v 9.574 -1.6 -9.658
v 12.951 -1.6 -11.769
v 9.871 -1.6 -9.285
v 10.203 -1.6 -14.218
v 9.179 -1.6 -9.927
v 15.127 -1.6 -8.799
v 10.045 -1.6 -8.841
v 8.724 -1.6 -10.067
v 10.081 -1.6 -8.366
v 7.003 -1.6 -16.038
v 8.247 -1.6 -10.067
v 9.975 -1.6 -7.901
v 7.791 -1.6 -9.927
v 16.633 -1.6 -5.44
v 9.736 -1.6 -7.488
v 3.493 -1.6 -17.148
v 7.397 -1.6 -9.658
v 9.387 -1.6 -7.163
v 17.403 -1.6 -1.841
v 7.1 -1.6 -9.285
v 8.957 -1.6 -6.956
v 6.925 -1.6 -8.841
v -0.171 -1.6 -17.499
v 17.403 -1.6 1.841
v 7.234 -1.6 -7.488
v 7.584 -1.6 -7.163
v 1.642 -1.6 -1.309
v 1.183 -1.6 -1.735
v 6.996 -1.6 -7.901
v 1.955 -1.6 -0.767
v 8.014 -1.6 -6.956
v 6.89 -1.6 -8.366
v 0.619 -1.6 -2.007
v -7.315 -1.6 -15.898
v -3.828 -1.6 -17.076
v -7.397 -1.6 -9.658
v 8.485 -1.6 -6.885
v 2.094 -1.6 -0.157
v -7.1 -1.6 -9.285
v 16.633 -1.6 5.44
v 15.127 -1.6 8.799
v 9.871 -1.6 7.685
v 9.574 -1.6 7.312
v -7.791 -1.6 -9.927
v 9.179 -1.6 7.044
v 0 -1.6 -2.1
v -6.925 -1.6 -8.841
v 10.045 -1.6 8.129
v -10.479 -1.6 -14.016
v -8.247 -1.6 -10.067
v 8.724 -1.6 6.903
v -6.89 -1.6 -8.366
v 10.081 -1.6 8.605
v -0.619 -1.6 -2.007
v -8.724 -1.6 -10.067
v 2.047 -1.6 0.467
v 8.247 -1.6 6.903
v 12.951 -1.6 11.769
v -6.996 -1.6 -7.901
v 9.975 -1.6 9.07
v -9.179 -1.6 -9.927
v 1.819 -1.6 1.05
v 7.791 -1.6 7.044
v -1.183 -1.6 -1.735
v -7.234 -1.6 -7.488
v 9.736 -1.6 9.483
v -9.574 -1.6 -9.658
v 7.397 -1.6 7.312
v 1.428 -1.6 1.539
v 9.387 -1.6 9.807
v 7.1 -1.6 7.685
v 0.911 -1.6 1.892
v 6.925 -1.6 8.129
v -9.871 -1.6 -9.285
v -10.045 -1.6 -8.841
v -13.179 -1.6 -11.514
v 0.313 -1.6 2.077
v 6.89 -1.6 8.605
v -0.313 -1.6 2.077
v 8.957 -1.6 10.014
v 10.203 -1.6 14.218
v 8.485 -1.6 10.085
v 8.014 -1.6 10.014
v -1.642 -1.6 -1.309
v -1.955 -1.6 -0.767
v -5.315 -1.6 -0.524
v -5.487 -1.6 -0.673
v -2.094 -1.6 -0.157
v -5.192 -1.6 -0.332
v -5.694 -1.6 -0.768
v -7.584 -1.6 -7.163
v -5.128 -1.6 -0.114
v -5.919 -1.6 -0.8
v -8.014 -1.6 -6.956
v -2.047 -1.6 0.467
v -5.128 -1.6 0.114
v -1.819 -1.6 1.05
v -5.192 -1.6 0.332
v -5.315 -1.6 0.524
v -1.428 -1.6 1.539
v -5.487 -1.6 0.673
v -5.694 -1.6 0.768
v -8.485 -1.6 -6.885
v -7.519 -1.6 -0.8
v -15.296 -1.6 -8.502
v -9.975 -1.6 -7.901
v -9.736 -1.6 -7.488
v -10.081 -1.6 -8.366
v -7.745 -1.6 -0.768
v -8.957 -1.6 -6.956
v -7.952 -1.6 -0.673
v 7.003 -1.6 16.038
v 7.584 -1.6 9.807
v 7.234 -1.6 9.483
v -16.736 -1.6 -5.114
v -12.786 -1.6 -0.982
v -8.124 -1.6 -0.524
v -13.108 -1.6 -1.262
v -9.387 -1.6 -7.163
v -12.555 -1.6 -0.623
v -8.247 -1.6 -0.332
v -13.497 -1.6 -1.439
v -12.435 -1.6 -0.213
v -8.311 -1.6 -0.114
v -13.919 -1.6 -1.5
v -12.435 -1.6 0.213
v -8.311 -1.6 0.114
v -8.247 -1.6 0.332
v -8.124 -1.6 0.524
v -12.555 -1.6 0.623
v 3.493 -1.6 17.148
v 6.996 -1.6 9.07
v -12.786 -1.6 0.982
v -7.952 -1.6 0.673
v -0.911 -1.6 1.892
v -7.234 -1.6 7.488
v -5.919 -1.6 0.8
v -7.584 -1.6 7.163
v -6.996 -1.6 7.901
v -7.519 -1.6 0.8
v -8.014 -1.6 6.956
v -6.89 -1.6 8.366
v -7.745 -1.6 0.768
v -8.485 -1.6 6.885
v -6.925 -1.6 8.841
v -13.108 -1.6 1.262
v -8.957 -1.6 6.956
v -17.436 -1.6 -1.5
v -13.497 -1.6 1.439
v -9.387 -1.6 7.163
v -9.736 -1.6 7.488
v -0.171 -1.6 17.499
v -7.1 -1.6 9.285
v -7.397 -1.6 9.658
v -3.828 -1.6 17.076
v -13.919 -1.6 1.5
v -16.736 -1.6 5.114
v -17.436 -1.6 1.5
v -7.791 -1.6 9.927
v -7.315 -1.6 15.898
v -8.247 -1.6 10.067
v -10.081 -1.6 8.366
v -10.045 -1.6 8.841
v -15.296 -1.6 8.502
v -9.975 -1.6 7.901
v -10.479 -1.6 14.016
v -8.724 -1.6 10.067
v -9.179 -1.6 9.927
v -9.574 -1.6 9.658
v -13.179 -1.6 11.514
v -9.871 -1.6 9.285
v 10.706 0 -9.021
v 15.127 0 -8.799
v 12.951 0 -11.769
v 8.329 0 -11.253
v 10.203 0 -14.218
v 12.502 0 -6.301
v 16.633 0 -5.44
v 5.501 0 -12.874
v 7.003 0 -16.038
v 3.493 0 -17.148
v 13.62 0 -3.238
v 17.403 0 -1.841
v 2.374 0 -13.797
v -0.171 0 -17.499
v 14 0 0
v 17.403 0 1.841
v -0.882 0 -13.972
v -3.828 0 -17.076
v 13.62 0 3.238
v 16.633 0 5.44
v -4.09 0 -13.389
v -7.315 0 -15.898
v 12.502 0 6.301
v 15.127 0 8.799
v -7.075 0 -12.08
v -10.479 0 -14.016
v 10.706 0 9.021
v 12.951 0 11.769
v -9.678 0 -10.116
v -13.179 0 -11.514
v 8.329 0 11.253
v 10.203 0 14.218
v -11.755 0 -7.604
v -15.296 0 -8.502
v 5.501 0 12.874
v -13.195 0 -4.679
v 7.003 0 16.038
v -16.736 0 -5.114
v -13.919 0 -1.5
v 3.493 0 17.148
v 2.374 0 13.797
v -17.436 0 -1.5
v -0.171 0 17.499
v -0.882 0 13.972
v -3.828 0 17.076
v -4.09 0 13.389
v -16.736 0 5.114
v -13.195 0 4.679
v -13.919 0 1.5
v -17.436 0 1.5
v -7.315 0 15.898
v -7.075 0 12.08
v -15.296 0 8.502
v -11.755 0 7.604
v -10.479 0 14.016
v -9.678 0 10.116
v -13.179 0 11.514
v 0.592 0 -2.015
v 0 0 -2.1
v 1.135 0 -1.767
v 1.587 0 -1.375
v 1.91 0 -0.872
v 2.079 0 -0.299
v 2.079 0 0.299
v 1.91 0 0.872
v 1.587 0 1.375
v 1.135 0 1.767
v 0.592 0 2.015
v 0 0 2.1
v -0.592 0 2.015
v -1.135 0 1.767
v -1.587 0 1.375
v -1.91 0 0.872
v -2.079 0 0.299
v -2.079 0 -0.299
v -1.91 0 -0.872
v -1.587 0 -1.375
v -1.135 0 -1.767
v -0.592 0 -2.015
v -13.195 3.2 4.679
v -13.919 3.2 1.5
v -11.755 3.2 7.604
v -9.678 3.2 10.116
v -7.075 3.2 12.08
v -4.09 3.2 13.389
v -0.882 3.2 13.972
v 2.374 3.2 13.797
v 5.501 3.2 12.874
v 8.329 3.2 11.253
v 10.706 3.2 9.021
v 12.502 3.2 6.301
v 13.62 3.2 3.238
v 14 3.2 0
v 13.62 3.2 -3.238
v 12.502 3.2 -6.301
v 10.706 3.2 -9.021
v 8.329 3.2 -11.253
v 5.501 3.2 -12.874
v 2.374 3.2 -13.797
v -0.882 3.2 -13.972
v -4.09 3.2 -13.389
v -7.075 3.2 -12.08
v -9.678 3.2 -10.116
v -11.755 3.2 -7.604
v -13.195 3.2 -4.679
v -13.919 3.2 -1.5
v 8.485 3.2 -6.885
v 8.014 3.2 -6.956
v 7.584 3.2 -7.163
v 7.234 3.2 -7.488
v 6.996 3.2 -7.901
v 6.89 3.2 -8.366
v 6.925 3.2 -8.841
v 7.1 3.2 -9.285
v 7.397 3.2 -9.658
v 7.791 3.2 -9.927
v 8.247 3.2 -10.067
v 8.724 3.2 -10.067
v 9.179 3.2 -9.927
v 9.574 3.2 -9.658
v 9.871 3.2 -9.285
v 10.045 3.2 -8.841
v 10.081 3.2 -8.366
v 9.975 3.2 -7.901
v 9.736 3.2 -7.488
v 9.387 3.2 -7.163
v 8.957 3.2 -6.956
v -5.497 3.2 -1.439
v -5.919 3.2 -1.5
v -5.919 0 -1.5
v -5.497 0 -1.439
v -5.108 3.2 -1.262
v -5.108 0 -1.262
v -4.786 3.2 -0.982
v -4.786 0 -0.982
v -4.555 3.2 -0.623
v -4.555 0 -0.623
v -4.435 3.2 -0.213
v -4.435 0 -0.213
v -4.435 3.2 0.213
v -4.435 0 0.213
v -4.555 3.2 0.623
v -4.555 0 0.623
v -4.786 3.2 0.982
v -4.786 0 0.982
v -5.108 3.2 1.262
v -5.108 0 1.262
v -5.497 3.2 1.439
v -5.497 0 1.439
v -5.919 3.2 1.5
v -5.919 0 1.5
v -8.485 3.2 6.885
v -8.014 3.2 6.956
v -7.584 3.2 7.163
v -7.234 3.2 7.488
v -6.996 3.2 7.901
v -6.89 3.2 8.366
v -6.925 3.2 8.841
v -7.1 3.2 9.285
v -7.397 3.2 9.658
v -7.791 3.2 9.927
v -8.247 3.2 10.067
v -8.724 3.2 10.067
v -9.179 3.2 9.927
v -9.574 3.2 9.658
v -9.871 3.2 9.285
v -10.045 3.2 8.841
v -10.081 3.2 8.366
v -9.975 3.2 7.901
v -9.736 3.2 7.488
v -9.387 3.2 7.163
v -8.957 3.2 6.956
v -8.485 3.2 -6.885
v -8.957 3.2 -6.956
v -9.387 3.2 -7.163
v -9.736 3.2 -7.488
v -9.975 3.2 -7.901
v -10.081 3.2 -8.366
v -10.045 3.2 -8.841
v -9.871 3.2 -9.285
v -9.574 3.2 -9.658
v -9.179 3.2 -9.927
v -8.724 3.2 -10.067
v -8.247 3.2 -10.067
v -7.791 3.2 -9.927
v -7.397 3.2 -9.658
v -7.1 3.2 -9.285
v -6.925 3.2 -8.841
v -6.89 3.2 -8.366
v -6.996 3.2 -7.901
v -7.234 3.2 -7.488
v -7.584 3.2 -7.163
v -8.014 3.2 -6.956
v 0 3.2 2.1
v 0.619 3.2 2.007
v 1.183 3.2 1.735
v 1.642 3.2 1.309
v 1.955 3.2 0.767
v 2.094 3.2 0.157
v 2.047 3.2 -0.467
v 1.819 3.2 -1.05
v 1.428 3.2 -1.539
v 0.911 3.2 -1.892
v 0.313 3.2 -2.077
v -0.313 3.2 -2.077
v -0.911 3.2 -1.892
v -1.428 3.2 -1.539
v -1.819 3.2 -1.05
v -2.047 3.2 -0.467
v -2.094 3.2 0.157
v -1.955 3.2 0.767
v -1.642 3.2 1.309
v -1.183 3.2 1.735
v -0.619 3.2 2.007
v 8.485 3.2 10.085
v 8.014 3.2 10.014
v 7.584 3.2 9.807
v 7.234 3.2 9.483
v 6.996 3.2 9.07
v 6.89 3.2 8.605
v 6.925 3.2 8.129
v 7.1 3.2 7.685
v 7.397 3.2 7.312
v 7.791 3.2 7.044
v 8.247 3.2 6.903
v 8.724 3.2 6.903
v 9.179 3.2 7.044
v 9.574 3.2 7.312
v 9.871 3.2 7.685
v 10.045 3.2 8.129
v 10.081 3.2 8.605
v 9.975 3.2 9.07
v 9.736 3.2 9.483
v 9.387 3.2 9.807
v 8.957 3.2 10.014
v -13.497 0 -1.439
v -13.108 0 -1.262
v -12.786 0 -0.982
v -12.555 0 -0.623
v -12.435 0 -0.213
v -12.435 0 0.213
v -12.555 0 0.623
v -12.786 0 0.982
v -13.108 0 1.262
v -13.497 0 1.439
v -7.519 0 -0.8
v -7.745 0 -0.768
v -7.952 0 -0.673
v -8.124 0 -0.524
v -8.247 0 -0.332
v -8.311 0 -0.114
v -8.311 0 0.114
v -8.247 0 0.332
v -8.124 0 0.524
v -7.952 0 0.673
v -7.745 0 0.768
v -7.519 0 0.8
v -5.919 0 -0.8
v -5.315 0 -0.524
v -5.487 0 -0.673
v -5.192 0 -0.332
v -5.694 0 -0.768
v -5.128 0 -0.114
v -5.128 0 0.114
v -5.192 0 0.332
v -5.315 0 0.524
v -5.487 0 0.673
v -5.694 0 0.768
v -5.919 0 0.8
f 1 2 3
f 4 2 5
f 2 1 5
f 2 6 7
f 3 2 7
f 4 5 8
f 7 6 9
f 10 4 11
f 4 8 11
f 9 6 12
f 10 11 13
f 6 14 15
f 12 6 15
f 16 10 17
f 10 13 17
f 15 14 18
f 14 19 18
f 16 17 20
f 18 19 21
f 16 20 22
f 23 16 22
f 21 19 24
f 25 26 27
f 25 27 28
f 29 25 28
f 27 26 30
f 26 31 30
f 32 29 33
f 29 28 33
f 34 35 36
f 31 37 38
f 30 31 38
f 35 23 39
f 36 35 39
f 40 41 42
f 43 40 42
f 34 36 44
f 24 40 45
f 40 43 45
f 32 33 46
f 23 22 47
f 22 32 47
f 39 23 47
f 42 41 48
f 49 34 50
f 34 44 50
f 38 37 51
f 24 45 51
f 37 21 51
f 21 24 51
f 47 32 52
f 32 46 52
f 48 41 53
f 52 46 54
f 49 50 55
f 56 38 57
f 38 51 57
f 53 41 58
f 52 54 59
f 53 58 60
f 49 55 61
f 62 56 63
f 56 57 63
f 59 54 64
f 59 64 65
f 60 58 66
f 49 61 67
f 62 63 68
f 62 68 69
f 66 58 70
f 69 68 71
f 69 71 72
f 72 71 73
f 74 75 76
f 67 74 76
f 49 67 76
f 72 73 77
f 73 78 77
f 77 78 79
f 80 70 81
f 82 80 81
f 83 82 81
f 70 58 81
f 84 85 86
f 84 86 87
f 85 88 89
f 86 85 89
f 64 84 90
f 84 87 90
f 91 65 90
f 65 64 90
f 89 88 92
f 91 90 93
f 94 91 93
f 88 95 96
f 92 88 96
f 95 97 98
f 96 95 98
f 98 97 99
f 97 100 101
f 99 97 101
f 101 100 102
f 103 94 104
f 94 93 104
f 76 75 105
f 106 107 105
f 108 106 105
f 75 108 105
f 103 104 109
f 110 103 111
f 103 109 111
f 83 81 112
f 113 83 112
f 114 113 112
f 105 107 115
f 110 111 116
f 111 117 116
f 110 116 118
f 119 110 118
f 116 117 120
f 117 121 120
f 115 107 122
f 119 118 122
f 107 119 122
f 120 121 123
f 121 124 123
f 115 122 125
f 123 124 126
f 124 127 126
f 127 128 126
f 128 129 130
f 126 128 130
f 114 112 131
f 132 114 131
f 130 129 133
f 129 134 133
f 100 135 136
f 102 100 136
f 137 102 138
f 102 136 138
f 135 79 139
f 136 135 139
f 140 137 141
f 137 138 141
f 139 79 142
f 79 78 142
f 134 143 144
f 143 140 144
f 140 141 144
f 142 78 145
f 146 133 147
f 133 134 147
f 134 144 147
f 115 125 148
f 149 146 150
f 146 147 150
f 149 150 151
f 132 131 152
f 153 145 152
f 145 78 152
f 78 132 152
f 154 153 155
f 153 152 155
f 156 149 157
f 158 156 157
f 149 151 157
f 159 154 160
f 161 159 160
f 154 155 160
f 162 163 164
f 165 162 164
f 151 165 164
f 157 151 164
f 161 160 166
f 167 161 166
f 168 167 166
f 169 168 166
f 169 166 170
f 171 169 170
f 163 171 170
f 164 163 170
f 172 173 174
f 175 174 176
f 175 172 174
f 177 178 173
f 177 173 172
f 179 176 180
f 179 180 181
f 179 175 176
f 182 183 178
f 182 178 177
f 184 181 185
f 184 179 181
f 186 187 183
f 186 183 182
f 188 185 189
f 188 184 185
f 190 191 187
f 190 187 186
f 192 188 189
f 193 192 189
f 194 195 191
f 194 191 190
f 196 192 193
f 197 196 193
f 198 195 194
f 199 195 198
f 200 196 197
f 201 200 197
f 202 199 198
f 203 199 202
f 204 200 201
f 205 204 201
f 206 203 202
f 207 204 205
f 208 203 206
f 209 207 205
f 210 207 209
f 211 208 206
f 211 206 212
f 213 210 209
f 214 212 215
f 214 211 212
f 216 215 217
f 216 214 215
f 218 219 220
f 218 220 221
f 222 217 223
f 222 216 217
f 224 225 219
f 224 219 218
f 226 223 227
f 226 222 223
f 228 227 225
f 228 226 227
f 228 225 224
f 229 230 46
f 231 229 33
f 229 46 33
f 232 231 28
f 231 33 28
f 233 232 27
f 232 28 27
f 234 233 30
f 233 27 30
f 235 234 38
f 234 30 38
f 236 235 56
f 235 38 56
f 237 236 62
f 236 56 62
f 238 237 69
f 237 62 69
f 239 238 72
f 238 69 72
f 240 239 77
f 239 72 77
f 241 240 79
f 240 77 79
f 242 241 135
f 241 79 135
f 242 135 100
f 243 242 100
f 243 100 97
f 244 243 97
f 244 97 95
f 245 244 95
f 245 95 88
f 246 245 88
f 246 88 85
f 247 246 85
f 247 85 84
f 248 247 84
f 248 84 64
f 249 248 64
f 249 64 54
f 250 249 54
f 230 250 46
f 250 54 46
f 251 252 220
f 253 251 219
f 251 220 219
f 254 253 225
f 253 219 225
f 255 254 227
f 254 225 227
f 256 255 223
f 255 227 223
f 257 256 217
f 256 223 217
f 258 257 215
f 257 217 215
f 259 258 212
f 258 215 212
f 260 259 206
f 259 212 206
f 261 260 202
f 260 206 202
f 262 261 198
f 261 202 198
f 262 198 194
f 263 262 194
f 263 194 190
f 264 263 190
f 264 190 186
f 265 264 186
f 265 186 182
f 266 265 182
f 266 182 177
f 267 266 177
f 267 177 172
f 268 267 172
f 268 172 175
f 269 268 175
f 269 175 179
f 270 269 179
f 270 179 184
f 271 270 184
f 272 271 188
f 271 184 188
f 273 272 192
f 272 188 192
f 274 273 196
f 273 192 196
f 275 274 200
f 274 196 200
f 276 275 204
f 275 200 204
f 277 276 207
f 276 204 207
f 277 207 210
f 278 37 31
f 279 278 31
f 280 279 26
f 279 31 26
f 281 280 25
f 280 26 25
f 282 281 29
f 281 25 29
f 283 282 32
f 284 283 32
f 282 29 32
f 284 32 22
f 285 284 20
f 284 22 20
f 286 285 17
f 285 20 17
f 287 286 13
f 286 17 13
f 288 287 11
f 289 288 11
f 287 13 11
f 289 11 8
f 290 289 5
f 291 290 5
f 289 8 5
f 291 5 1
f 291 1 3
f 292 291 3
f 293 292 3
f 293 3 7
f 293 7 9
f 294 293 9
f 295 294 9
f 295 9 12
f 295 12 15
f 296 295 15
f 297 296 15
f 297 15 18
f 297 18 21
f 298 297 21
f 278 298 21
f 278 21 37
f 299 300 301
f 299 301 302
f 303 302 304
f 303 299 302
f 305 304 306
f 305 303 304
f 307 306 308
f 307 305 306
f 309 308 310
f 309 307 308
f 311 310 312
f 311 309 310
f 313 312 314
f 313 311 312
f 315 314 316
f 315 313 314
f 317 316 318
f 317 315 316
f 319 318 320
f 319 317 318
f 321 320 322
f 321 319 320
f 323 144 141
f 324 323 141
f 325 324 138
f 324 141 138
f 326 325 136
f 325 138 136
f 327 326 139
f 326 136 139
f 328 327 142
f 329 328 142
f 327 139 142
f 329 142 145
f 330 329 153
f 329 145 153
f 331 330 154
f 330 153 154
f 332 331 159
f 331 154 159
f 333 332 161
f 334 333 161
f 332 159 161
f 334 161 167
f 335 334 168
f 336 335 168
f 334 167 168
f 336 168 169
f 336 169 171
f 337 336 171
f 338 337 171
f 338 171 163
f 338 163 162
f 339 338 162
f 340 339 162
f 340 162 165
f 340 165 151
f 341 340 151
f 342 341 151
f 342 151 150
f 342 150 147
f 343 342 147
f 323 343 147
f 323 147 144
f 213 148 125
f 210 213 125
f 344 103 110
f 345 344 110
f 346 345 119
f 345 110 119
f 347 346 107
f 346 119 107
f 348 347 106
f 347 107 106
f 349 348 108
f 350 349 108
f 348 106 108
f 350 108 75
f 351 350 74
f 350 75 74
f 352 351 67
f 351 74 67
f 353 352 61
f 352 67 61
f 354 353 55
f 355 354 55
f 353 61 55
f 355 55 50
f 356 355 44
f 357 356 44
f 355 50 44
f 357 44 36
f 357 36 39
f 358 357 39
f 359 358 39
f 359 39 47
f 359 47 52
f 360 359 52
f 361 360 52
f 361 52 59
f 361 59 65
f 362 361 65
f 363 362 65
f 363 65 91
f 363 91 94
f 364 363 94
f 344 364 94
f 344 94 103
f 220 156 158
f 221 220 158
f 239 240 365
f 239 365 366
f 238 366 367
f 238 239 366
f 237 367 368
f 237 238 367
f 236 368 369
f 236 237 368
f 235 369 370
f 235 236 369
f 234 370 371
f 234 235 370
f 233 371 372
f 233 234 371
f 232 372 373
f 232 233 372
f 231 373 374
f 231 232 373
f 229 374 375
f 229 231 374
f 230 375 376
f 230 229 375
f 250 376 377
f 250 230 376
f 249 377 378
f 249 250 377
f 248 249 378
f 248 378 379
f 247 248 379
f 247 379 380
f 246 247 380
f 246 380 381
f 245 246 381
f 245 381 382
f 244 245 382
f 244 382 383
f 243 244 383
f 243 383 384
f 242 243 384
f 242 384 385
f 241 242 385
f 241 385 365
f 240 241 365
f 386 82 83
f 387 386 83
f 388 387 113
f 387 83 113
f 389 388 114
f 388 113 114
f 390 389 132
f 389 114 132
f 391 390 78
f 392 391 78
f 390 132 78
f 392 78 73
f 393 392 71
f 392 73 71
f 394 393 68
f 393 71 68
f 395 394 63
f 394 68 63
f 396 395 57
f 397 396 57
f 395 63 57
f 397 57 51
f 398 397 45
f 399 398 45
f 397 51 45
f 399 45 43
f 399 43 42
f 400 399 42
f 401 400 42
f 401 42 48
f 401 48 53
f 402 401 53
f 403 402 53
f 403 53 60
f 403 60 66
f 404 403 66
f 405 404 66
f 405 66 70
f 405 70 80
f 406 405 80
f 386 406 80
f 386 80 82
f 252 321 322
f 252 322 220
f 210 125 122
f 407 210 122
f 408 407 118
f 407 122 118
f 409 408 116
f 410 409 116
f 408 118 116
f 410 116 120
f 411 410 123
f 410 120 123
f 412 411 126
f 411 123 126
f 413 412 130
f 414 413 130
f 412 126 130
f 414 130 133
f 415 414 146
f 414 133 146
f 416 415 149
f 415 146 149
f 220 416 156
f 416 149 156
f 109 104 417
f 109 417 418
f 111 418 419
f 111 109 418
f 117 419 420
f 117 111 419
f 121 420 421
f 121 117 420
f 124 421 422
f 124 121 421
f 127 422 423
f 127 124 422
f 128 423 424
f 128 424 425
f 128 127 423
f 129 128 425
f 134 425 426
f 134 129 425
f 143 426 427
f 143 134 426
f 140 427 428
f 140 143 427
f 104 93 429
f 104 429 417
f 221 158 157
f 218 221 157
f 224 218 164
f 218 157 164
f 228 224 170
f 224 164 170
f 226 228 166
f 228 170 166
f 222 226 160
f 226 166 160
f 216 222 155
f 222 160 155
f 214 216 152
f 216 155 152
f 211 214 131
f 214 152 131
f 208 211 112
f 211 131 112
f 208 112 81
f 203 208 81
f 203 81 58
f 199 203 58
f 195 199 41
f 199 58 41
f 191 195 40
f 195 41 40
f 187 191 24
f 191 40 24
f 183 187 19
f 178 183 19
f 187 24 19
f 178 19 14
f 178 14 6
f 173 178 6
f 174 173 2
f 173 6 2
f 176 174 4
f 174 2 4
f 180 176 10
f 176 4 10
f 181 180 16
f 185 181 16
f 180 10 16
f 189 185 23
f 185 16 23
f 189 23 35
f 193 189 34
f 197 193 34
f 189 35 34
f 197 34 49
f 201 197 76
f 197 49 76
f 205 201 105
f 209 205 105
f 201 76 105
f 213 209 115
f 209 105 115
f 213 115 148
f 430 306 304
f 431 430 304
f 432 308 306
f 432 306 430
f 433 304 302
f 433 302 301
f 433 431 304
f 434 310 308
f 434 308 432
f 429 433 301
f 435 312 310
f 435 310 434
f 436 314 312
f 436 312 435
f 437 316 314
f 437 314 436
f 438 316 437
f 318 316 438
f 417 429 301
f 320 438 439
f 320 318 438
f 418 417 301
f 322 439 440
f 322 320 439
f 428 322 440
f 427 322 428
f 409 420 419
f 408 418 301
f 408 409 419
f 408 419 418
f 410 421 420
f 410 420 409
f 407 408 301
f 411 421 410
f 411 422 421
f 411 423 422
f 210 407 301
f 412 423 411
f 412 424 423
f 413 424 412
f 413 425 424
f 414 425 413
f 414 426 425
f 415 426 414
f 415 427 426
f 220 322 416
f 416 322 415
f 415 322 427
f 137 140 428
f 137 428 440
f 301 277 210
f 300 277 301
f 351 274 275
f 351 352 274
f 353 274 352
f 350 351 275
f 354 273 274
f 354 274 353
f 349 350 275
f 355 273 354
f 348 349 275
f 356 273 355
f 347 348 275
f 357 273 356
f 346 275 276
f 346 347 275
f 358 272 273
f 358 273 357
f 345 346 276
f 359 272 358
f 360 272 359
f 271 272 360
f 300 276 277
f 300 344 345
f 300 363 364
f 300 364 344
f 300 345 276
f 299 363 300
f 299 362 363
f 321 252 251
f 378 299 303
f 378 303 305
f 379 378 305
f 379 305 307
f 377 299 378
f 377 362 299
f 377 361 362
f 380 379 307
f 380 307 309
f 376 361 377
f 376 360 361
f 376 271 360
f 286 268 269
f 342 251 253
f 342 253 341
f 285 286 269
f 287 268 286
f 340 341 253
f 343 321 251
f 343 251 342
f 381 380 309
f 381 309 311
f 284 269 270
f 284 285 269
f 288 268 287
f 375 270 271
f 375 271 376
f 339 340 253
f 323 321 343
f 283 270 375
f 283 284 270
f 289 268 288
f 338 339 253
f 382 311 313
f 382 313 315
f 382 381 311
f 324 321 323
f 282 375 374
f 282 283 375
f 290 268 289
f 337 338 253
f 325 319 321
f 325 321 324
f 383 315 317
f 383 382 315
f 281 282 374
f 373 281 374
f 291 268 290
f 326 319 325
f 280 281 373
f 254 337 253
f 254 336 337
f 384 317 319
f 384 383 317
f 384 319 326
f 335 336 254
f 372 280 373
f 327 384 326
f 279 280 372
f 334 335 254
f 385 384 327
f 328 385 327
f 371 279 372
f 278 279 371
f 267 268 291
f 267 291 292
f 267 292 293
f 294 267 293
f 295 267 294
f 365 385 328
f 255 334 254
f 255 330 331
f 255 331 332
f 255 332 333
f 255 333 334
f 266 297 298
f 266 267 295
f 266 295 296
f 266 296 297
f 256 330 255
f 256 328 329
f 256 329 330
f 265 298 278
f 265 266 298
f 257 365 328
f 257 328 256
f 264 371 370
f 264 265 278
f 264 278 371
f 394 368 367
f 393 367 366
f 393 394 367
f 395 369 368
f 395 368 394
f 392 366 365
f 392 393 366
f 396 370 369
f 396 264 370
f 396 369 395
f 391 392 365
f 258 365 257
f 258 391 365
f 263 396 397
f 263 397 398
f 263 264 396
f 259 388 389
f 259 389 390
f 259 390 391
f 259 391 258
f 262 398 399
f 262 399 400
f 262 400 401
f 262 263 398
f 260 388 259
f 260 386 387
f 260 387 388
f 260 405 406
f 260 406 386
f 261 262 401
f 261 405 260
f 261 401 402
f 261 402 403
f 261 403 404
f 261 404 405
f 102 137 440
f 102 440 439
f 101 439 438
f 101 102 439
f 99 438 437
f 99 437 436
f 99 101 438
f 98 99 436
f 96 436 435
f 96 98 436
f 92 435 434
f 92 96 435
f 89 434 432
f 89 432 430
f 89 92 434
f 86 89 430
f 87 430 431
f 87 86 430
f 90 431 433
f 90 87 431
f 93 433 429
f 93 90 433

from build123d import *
from build123d.topology import SkipClean

# Parameters (mm, degrees)
SKETCH_1_R          = 14
SKETCH_1_R_2        = 2.1
EXTRUDE_1_DEPTH     = 3.2
CUT_EXTRUDE_1_DEPTH = 10
EXTRUDE_START       = 1.6
SKETCH_3_R          = 2.1
EXTRUDE_2_DEPTH     = 1.6
SKETCH_4_R          = 1.6
CUT_EXTRUDE_2_DEPTH = 26.209918683


with BuildPart() as part:
    # ｽｹｯﾁ1 → ﾎﾞｽ - 押し出し1 (new body)
    with BuildSketch(Plane(origin=(0, 0, 0), x_dir=(1, 0, 0), z_dir=(0, 1, 0))):
        with Locations(Location((0, 0, 0), (0, 0, 270))):
            Circle(SKETCH_1_R)
        with Locations(Location((0, 0, 0), (0, 0, 270))):
            Circle(SKETCH_1_R_2, mode=Mode.SUBTRACT)
    extrude(amount=EXTRUDE_1_DEPTH)

    # ｽｹｯﾁ2 → ｶｯﾄ - 押し出し1 (cut)
    with BuildSketch(Plane(origin=(0, 3.2, 0), x_dir=(1, 0, 0), z_dir=(0, 1, 0))):
        with BuildLine():
            Line((-13.919410907, 1.5), (-5.919410907, 1.5))
            ThreePointArc((-5.919410907, 1.5), (-4.419410907, 0), (-5.919410907, -1.5))
            Line((-5.919410907, -1.5), (-13.919410907, -1.5))
            ThreePointArc((-13.919410907, -1.5), (-15.419410907, 0), (-13.919410907, 1.5))
        make_face()
    extrude(amount=-CUT_EXTRUDE_1_DEPTH, mode=Mode.SUBTRACT)

    # ｽｹｯﾁ3 → ﾎﾞｽ - 押し出し2 (add)
    with SkipClean():  # the faces are left unmerged after this step: merging them gives an invalid solid
        with BuildSketch(Plane.XZ.offset(EXTRUDE_START)):
            with BuildLine():
                Line((-17.435595774, -1.5), (-13.919410907, -1.5))
                ThreePointArc((-13.919410907, -1.5), (-12.419410907, 0), (-13.919410907, 1.5))
                Line((-13.919410907, 1.5), (-17.435595774, 1.5))
                ThreePointArc((-17.435595774, 1.5), (17.5, 0), (-17.435595774, -1.5))
            make_face()
            with Locations(Location((0, 0, 0), (0, 0, 270))):
                Circle(SKETCH_3_R, mode=Mode.SUBTRACT)
            with BuildLine():
                Line((-5.919410907, -0.8), (-7.519410907, -0.8))
                ThreePointArc((-7.519410907, -0.8), (-8.319410907, 0), (-7.519410907, 0.8))
                Line((-7.519410907, 0.8), (-5.919410907, 0.8))
                ThreePointArc((-5.919410907, 0.8), (-5.119410907, 0), (-5.919410907, -0.8))
            make_face(mode=Mode.SUBTRACT)
        extrude(amount=-EXTRUDE_2_DEPTH)

    # ｽｹｯﾁ4 → ｶｯﾄ - 押し出し2 (cut, through all)
    with SkipClean():  # the faces are left unmerged after this step: merging them gives an invalid solid
        with BuildSketch(Plane.XZ.offset(1.6)):
            with Locations(Location((-8.485281374, 8.485281374, 0), (0, 0, 270))):
                Circle(SKETCH_4_R)
            with Locations(Location((8.485281374, -8.485281374, 0), (0, 0, 90))):
                Circle(SKETCH_4_R)
            with Locations(Location((8.485281374, 8.485281374, 0), (0, 0, 90))):
                Circle(SKETCH_4_R)
            with Locations(Location((-8.485281374, -8.485281374, 0), (0, 0, 90))):
                Circle(SKETCH_4_R)
        extrude(amount=-CUT_EXTRUDE_2_DEPTH, mode=Mode.SUBTRACT)


solid = part.part
